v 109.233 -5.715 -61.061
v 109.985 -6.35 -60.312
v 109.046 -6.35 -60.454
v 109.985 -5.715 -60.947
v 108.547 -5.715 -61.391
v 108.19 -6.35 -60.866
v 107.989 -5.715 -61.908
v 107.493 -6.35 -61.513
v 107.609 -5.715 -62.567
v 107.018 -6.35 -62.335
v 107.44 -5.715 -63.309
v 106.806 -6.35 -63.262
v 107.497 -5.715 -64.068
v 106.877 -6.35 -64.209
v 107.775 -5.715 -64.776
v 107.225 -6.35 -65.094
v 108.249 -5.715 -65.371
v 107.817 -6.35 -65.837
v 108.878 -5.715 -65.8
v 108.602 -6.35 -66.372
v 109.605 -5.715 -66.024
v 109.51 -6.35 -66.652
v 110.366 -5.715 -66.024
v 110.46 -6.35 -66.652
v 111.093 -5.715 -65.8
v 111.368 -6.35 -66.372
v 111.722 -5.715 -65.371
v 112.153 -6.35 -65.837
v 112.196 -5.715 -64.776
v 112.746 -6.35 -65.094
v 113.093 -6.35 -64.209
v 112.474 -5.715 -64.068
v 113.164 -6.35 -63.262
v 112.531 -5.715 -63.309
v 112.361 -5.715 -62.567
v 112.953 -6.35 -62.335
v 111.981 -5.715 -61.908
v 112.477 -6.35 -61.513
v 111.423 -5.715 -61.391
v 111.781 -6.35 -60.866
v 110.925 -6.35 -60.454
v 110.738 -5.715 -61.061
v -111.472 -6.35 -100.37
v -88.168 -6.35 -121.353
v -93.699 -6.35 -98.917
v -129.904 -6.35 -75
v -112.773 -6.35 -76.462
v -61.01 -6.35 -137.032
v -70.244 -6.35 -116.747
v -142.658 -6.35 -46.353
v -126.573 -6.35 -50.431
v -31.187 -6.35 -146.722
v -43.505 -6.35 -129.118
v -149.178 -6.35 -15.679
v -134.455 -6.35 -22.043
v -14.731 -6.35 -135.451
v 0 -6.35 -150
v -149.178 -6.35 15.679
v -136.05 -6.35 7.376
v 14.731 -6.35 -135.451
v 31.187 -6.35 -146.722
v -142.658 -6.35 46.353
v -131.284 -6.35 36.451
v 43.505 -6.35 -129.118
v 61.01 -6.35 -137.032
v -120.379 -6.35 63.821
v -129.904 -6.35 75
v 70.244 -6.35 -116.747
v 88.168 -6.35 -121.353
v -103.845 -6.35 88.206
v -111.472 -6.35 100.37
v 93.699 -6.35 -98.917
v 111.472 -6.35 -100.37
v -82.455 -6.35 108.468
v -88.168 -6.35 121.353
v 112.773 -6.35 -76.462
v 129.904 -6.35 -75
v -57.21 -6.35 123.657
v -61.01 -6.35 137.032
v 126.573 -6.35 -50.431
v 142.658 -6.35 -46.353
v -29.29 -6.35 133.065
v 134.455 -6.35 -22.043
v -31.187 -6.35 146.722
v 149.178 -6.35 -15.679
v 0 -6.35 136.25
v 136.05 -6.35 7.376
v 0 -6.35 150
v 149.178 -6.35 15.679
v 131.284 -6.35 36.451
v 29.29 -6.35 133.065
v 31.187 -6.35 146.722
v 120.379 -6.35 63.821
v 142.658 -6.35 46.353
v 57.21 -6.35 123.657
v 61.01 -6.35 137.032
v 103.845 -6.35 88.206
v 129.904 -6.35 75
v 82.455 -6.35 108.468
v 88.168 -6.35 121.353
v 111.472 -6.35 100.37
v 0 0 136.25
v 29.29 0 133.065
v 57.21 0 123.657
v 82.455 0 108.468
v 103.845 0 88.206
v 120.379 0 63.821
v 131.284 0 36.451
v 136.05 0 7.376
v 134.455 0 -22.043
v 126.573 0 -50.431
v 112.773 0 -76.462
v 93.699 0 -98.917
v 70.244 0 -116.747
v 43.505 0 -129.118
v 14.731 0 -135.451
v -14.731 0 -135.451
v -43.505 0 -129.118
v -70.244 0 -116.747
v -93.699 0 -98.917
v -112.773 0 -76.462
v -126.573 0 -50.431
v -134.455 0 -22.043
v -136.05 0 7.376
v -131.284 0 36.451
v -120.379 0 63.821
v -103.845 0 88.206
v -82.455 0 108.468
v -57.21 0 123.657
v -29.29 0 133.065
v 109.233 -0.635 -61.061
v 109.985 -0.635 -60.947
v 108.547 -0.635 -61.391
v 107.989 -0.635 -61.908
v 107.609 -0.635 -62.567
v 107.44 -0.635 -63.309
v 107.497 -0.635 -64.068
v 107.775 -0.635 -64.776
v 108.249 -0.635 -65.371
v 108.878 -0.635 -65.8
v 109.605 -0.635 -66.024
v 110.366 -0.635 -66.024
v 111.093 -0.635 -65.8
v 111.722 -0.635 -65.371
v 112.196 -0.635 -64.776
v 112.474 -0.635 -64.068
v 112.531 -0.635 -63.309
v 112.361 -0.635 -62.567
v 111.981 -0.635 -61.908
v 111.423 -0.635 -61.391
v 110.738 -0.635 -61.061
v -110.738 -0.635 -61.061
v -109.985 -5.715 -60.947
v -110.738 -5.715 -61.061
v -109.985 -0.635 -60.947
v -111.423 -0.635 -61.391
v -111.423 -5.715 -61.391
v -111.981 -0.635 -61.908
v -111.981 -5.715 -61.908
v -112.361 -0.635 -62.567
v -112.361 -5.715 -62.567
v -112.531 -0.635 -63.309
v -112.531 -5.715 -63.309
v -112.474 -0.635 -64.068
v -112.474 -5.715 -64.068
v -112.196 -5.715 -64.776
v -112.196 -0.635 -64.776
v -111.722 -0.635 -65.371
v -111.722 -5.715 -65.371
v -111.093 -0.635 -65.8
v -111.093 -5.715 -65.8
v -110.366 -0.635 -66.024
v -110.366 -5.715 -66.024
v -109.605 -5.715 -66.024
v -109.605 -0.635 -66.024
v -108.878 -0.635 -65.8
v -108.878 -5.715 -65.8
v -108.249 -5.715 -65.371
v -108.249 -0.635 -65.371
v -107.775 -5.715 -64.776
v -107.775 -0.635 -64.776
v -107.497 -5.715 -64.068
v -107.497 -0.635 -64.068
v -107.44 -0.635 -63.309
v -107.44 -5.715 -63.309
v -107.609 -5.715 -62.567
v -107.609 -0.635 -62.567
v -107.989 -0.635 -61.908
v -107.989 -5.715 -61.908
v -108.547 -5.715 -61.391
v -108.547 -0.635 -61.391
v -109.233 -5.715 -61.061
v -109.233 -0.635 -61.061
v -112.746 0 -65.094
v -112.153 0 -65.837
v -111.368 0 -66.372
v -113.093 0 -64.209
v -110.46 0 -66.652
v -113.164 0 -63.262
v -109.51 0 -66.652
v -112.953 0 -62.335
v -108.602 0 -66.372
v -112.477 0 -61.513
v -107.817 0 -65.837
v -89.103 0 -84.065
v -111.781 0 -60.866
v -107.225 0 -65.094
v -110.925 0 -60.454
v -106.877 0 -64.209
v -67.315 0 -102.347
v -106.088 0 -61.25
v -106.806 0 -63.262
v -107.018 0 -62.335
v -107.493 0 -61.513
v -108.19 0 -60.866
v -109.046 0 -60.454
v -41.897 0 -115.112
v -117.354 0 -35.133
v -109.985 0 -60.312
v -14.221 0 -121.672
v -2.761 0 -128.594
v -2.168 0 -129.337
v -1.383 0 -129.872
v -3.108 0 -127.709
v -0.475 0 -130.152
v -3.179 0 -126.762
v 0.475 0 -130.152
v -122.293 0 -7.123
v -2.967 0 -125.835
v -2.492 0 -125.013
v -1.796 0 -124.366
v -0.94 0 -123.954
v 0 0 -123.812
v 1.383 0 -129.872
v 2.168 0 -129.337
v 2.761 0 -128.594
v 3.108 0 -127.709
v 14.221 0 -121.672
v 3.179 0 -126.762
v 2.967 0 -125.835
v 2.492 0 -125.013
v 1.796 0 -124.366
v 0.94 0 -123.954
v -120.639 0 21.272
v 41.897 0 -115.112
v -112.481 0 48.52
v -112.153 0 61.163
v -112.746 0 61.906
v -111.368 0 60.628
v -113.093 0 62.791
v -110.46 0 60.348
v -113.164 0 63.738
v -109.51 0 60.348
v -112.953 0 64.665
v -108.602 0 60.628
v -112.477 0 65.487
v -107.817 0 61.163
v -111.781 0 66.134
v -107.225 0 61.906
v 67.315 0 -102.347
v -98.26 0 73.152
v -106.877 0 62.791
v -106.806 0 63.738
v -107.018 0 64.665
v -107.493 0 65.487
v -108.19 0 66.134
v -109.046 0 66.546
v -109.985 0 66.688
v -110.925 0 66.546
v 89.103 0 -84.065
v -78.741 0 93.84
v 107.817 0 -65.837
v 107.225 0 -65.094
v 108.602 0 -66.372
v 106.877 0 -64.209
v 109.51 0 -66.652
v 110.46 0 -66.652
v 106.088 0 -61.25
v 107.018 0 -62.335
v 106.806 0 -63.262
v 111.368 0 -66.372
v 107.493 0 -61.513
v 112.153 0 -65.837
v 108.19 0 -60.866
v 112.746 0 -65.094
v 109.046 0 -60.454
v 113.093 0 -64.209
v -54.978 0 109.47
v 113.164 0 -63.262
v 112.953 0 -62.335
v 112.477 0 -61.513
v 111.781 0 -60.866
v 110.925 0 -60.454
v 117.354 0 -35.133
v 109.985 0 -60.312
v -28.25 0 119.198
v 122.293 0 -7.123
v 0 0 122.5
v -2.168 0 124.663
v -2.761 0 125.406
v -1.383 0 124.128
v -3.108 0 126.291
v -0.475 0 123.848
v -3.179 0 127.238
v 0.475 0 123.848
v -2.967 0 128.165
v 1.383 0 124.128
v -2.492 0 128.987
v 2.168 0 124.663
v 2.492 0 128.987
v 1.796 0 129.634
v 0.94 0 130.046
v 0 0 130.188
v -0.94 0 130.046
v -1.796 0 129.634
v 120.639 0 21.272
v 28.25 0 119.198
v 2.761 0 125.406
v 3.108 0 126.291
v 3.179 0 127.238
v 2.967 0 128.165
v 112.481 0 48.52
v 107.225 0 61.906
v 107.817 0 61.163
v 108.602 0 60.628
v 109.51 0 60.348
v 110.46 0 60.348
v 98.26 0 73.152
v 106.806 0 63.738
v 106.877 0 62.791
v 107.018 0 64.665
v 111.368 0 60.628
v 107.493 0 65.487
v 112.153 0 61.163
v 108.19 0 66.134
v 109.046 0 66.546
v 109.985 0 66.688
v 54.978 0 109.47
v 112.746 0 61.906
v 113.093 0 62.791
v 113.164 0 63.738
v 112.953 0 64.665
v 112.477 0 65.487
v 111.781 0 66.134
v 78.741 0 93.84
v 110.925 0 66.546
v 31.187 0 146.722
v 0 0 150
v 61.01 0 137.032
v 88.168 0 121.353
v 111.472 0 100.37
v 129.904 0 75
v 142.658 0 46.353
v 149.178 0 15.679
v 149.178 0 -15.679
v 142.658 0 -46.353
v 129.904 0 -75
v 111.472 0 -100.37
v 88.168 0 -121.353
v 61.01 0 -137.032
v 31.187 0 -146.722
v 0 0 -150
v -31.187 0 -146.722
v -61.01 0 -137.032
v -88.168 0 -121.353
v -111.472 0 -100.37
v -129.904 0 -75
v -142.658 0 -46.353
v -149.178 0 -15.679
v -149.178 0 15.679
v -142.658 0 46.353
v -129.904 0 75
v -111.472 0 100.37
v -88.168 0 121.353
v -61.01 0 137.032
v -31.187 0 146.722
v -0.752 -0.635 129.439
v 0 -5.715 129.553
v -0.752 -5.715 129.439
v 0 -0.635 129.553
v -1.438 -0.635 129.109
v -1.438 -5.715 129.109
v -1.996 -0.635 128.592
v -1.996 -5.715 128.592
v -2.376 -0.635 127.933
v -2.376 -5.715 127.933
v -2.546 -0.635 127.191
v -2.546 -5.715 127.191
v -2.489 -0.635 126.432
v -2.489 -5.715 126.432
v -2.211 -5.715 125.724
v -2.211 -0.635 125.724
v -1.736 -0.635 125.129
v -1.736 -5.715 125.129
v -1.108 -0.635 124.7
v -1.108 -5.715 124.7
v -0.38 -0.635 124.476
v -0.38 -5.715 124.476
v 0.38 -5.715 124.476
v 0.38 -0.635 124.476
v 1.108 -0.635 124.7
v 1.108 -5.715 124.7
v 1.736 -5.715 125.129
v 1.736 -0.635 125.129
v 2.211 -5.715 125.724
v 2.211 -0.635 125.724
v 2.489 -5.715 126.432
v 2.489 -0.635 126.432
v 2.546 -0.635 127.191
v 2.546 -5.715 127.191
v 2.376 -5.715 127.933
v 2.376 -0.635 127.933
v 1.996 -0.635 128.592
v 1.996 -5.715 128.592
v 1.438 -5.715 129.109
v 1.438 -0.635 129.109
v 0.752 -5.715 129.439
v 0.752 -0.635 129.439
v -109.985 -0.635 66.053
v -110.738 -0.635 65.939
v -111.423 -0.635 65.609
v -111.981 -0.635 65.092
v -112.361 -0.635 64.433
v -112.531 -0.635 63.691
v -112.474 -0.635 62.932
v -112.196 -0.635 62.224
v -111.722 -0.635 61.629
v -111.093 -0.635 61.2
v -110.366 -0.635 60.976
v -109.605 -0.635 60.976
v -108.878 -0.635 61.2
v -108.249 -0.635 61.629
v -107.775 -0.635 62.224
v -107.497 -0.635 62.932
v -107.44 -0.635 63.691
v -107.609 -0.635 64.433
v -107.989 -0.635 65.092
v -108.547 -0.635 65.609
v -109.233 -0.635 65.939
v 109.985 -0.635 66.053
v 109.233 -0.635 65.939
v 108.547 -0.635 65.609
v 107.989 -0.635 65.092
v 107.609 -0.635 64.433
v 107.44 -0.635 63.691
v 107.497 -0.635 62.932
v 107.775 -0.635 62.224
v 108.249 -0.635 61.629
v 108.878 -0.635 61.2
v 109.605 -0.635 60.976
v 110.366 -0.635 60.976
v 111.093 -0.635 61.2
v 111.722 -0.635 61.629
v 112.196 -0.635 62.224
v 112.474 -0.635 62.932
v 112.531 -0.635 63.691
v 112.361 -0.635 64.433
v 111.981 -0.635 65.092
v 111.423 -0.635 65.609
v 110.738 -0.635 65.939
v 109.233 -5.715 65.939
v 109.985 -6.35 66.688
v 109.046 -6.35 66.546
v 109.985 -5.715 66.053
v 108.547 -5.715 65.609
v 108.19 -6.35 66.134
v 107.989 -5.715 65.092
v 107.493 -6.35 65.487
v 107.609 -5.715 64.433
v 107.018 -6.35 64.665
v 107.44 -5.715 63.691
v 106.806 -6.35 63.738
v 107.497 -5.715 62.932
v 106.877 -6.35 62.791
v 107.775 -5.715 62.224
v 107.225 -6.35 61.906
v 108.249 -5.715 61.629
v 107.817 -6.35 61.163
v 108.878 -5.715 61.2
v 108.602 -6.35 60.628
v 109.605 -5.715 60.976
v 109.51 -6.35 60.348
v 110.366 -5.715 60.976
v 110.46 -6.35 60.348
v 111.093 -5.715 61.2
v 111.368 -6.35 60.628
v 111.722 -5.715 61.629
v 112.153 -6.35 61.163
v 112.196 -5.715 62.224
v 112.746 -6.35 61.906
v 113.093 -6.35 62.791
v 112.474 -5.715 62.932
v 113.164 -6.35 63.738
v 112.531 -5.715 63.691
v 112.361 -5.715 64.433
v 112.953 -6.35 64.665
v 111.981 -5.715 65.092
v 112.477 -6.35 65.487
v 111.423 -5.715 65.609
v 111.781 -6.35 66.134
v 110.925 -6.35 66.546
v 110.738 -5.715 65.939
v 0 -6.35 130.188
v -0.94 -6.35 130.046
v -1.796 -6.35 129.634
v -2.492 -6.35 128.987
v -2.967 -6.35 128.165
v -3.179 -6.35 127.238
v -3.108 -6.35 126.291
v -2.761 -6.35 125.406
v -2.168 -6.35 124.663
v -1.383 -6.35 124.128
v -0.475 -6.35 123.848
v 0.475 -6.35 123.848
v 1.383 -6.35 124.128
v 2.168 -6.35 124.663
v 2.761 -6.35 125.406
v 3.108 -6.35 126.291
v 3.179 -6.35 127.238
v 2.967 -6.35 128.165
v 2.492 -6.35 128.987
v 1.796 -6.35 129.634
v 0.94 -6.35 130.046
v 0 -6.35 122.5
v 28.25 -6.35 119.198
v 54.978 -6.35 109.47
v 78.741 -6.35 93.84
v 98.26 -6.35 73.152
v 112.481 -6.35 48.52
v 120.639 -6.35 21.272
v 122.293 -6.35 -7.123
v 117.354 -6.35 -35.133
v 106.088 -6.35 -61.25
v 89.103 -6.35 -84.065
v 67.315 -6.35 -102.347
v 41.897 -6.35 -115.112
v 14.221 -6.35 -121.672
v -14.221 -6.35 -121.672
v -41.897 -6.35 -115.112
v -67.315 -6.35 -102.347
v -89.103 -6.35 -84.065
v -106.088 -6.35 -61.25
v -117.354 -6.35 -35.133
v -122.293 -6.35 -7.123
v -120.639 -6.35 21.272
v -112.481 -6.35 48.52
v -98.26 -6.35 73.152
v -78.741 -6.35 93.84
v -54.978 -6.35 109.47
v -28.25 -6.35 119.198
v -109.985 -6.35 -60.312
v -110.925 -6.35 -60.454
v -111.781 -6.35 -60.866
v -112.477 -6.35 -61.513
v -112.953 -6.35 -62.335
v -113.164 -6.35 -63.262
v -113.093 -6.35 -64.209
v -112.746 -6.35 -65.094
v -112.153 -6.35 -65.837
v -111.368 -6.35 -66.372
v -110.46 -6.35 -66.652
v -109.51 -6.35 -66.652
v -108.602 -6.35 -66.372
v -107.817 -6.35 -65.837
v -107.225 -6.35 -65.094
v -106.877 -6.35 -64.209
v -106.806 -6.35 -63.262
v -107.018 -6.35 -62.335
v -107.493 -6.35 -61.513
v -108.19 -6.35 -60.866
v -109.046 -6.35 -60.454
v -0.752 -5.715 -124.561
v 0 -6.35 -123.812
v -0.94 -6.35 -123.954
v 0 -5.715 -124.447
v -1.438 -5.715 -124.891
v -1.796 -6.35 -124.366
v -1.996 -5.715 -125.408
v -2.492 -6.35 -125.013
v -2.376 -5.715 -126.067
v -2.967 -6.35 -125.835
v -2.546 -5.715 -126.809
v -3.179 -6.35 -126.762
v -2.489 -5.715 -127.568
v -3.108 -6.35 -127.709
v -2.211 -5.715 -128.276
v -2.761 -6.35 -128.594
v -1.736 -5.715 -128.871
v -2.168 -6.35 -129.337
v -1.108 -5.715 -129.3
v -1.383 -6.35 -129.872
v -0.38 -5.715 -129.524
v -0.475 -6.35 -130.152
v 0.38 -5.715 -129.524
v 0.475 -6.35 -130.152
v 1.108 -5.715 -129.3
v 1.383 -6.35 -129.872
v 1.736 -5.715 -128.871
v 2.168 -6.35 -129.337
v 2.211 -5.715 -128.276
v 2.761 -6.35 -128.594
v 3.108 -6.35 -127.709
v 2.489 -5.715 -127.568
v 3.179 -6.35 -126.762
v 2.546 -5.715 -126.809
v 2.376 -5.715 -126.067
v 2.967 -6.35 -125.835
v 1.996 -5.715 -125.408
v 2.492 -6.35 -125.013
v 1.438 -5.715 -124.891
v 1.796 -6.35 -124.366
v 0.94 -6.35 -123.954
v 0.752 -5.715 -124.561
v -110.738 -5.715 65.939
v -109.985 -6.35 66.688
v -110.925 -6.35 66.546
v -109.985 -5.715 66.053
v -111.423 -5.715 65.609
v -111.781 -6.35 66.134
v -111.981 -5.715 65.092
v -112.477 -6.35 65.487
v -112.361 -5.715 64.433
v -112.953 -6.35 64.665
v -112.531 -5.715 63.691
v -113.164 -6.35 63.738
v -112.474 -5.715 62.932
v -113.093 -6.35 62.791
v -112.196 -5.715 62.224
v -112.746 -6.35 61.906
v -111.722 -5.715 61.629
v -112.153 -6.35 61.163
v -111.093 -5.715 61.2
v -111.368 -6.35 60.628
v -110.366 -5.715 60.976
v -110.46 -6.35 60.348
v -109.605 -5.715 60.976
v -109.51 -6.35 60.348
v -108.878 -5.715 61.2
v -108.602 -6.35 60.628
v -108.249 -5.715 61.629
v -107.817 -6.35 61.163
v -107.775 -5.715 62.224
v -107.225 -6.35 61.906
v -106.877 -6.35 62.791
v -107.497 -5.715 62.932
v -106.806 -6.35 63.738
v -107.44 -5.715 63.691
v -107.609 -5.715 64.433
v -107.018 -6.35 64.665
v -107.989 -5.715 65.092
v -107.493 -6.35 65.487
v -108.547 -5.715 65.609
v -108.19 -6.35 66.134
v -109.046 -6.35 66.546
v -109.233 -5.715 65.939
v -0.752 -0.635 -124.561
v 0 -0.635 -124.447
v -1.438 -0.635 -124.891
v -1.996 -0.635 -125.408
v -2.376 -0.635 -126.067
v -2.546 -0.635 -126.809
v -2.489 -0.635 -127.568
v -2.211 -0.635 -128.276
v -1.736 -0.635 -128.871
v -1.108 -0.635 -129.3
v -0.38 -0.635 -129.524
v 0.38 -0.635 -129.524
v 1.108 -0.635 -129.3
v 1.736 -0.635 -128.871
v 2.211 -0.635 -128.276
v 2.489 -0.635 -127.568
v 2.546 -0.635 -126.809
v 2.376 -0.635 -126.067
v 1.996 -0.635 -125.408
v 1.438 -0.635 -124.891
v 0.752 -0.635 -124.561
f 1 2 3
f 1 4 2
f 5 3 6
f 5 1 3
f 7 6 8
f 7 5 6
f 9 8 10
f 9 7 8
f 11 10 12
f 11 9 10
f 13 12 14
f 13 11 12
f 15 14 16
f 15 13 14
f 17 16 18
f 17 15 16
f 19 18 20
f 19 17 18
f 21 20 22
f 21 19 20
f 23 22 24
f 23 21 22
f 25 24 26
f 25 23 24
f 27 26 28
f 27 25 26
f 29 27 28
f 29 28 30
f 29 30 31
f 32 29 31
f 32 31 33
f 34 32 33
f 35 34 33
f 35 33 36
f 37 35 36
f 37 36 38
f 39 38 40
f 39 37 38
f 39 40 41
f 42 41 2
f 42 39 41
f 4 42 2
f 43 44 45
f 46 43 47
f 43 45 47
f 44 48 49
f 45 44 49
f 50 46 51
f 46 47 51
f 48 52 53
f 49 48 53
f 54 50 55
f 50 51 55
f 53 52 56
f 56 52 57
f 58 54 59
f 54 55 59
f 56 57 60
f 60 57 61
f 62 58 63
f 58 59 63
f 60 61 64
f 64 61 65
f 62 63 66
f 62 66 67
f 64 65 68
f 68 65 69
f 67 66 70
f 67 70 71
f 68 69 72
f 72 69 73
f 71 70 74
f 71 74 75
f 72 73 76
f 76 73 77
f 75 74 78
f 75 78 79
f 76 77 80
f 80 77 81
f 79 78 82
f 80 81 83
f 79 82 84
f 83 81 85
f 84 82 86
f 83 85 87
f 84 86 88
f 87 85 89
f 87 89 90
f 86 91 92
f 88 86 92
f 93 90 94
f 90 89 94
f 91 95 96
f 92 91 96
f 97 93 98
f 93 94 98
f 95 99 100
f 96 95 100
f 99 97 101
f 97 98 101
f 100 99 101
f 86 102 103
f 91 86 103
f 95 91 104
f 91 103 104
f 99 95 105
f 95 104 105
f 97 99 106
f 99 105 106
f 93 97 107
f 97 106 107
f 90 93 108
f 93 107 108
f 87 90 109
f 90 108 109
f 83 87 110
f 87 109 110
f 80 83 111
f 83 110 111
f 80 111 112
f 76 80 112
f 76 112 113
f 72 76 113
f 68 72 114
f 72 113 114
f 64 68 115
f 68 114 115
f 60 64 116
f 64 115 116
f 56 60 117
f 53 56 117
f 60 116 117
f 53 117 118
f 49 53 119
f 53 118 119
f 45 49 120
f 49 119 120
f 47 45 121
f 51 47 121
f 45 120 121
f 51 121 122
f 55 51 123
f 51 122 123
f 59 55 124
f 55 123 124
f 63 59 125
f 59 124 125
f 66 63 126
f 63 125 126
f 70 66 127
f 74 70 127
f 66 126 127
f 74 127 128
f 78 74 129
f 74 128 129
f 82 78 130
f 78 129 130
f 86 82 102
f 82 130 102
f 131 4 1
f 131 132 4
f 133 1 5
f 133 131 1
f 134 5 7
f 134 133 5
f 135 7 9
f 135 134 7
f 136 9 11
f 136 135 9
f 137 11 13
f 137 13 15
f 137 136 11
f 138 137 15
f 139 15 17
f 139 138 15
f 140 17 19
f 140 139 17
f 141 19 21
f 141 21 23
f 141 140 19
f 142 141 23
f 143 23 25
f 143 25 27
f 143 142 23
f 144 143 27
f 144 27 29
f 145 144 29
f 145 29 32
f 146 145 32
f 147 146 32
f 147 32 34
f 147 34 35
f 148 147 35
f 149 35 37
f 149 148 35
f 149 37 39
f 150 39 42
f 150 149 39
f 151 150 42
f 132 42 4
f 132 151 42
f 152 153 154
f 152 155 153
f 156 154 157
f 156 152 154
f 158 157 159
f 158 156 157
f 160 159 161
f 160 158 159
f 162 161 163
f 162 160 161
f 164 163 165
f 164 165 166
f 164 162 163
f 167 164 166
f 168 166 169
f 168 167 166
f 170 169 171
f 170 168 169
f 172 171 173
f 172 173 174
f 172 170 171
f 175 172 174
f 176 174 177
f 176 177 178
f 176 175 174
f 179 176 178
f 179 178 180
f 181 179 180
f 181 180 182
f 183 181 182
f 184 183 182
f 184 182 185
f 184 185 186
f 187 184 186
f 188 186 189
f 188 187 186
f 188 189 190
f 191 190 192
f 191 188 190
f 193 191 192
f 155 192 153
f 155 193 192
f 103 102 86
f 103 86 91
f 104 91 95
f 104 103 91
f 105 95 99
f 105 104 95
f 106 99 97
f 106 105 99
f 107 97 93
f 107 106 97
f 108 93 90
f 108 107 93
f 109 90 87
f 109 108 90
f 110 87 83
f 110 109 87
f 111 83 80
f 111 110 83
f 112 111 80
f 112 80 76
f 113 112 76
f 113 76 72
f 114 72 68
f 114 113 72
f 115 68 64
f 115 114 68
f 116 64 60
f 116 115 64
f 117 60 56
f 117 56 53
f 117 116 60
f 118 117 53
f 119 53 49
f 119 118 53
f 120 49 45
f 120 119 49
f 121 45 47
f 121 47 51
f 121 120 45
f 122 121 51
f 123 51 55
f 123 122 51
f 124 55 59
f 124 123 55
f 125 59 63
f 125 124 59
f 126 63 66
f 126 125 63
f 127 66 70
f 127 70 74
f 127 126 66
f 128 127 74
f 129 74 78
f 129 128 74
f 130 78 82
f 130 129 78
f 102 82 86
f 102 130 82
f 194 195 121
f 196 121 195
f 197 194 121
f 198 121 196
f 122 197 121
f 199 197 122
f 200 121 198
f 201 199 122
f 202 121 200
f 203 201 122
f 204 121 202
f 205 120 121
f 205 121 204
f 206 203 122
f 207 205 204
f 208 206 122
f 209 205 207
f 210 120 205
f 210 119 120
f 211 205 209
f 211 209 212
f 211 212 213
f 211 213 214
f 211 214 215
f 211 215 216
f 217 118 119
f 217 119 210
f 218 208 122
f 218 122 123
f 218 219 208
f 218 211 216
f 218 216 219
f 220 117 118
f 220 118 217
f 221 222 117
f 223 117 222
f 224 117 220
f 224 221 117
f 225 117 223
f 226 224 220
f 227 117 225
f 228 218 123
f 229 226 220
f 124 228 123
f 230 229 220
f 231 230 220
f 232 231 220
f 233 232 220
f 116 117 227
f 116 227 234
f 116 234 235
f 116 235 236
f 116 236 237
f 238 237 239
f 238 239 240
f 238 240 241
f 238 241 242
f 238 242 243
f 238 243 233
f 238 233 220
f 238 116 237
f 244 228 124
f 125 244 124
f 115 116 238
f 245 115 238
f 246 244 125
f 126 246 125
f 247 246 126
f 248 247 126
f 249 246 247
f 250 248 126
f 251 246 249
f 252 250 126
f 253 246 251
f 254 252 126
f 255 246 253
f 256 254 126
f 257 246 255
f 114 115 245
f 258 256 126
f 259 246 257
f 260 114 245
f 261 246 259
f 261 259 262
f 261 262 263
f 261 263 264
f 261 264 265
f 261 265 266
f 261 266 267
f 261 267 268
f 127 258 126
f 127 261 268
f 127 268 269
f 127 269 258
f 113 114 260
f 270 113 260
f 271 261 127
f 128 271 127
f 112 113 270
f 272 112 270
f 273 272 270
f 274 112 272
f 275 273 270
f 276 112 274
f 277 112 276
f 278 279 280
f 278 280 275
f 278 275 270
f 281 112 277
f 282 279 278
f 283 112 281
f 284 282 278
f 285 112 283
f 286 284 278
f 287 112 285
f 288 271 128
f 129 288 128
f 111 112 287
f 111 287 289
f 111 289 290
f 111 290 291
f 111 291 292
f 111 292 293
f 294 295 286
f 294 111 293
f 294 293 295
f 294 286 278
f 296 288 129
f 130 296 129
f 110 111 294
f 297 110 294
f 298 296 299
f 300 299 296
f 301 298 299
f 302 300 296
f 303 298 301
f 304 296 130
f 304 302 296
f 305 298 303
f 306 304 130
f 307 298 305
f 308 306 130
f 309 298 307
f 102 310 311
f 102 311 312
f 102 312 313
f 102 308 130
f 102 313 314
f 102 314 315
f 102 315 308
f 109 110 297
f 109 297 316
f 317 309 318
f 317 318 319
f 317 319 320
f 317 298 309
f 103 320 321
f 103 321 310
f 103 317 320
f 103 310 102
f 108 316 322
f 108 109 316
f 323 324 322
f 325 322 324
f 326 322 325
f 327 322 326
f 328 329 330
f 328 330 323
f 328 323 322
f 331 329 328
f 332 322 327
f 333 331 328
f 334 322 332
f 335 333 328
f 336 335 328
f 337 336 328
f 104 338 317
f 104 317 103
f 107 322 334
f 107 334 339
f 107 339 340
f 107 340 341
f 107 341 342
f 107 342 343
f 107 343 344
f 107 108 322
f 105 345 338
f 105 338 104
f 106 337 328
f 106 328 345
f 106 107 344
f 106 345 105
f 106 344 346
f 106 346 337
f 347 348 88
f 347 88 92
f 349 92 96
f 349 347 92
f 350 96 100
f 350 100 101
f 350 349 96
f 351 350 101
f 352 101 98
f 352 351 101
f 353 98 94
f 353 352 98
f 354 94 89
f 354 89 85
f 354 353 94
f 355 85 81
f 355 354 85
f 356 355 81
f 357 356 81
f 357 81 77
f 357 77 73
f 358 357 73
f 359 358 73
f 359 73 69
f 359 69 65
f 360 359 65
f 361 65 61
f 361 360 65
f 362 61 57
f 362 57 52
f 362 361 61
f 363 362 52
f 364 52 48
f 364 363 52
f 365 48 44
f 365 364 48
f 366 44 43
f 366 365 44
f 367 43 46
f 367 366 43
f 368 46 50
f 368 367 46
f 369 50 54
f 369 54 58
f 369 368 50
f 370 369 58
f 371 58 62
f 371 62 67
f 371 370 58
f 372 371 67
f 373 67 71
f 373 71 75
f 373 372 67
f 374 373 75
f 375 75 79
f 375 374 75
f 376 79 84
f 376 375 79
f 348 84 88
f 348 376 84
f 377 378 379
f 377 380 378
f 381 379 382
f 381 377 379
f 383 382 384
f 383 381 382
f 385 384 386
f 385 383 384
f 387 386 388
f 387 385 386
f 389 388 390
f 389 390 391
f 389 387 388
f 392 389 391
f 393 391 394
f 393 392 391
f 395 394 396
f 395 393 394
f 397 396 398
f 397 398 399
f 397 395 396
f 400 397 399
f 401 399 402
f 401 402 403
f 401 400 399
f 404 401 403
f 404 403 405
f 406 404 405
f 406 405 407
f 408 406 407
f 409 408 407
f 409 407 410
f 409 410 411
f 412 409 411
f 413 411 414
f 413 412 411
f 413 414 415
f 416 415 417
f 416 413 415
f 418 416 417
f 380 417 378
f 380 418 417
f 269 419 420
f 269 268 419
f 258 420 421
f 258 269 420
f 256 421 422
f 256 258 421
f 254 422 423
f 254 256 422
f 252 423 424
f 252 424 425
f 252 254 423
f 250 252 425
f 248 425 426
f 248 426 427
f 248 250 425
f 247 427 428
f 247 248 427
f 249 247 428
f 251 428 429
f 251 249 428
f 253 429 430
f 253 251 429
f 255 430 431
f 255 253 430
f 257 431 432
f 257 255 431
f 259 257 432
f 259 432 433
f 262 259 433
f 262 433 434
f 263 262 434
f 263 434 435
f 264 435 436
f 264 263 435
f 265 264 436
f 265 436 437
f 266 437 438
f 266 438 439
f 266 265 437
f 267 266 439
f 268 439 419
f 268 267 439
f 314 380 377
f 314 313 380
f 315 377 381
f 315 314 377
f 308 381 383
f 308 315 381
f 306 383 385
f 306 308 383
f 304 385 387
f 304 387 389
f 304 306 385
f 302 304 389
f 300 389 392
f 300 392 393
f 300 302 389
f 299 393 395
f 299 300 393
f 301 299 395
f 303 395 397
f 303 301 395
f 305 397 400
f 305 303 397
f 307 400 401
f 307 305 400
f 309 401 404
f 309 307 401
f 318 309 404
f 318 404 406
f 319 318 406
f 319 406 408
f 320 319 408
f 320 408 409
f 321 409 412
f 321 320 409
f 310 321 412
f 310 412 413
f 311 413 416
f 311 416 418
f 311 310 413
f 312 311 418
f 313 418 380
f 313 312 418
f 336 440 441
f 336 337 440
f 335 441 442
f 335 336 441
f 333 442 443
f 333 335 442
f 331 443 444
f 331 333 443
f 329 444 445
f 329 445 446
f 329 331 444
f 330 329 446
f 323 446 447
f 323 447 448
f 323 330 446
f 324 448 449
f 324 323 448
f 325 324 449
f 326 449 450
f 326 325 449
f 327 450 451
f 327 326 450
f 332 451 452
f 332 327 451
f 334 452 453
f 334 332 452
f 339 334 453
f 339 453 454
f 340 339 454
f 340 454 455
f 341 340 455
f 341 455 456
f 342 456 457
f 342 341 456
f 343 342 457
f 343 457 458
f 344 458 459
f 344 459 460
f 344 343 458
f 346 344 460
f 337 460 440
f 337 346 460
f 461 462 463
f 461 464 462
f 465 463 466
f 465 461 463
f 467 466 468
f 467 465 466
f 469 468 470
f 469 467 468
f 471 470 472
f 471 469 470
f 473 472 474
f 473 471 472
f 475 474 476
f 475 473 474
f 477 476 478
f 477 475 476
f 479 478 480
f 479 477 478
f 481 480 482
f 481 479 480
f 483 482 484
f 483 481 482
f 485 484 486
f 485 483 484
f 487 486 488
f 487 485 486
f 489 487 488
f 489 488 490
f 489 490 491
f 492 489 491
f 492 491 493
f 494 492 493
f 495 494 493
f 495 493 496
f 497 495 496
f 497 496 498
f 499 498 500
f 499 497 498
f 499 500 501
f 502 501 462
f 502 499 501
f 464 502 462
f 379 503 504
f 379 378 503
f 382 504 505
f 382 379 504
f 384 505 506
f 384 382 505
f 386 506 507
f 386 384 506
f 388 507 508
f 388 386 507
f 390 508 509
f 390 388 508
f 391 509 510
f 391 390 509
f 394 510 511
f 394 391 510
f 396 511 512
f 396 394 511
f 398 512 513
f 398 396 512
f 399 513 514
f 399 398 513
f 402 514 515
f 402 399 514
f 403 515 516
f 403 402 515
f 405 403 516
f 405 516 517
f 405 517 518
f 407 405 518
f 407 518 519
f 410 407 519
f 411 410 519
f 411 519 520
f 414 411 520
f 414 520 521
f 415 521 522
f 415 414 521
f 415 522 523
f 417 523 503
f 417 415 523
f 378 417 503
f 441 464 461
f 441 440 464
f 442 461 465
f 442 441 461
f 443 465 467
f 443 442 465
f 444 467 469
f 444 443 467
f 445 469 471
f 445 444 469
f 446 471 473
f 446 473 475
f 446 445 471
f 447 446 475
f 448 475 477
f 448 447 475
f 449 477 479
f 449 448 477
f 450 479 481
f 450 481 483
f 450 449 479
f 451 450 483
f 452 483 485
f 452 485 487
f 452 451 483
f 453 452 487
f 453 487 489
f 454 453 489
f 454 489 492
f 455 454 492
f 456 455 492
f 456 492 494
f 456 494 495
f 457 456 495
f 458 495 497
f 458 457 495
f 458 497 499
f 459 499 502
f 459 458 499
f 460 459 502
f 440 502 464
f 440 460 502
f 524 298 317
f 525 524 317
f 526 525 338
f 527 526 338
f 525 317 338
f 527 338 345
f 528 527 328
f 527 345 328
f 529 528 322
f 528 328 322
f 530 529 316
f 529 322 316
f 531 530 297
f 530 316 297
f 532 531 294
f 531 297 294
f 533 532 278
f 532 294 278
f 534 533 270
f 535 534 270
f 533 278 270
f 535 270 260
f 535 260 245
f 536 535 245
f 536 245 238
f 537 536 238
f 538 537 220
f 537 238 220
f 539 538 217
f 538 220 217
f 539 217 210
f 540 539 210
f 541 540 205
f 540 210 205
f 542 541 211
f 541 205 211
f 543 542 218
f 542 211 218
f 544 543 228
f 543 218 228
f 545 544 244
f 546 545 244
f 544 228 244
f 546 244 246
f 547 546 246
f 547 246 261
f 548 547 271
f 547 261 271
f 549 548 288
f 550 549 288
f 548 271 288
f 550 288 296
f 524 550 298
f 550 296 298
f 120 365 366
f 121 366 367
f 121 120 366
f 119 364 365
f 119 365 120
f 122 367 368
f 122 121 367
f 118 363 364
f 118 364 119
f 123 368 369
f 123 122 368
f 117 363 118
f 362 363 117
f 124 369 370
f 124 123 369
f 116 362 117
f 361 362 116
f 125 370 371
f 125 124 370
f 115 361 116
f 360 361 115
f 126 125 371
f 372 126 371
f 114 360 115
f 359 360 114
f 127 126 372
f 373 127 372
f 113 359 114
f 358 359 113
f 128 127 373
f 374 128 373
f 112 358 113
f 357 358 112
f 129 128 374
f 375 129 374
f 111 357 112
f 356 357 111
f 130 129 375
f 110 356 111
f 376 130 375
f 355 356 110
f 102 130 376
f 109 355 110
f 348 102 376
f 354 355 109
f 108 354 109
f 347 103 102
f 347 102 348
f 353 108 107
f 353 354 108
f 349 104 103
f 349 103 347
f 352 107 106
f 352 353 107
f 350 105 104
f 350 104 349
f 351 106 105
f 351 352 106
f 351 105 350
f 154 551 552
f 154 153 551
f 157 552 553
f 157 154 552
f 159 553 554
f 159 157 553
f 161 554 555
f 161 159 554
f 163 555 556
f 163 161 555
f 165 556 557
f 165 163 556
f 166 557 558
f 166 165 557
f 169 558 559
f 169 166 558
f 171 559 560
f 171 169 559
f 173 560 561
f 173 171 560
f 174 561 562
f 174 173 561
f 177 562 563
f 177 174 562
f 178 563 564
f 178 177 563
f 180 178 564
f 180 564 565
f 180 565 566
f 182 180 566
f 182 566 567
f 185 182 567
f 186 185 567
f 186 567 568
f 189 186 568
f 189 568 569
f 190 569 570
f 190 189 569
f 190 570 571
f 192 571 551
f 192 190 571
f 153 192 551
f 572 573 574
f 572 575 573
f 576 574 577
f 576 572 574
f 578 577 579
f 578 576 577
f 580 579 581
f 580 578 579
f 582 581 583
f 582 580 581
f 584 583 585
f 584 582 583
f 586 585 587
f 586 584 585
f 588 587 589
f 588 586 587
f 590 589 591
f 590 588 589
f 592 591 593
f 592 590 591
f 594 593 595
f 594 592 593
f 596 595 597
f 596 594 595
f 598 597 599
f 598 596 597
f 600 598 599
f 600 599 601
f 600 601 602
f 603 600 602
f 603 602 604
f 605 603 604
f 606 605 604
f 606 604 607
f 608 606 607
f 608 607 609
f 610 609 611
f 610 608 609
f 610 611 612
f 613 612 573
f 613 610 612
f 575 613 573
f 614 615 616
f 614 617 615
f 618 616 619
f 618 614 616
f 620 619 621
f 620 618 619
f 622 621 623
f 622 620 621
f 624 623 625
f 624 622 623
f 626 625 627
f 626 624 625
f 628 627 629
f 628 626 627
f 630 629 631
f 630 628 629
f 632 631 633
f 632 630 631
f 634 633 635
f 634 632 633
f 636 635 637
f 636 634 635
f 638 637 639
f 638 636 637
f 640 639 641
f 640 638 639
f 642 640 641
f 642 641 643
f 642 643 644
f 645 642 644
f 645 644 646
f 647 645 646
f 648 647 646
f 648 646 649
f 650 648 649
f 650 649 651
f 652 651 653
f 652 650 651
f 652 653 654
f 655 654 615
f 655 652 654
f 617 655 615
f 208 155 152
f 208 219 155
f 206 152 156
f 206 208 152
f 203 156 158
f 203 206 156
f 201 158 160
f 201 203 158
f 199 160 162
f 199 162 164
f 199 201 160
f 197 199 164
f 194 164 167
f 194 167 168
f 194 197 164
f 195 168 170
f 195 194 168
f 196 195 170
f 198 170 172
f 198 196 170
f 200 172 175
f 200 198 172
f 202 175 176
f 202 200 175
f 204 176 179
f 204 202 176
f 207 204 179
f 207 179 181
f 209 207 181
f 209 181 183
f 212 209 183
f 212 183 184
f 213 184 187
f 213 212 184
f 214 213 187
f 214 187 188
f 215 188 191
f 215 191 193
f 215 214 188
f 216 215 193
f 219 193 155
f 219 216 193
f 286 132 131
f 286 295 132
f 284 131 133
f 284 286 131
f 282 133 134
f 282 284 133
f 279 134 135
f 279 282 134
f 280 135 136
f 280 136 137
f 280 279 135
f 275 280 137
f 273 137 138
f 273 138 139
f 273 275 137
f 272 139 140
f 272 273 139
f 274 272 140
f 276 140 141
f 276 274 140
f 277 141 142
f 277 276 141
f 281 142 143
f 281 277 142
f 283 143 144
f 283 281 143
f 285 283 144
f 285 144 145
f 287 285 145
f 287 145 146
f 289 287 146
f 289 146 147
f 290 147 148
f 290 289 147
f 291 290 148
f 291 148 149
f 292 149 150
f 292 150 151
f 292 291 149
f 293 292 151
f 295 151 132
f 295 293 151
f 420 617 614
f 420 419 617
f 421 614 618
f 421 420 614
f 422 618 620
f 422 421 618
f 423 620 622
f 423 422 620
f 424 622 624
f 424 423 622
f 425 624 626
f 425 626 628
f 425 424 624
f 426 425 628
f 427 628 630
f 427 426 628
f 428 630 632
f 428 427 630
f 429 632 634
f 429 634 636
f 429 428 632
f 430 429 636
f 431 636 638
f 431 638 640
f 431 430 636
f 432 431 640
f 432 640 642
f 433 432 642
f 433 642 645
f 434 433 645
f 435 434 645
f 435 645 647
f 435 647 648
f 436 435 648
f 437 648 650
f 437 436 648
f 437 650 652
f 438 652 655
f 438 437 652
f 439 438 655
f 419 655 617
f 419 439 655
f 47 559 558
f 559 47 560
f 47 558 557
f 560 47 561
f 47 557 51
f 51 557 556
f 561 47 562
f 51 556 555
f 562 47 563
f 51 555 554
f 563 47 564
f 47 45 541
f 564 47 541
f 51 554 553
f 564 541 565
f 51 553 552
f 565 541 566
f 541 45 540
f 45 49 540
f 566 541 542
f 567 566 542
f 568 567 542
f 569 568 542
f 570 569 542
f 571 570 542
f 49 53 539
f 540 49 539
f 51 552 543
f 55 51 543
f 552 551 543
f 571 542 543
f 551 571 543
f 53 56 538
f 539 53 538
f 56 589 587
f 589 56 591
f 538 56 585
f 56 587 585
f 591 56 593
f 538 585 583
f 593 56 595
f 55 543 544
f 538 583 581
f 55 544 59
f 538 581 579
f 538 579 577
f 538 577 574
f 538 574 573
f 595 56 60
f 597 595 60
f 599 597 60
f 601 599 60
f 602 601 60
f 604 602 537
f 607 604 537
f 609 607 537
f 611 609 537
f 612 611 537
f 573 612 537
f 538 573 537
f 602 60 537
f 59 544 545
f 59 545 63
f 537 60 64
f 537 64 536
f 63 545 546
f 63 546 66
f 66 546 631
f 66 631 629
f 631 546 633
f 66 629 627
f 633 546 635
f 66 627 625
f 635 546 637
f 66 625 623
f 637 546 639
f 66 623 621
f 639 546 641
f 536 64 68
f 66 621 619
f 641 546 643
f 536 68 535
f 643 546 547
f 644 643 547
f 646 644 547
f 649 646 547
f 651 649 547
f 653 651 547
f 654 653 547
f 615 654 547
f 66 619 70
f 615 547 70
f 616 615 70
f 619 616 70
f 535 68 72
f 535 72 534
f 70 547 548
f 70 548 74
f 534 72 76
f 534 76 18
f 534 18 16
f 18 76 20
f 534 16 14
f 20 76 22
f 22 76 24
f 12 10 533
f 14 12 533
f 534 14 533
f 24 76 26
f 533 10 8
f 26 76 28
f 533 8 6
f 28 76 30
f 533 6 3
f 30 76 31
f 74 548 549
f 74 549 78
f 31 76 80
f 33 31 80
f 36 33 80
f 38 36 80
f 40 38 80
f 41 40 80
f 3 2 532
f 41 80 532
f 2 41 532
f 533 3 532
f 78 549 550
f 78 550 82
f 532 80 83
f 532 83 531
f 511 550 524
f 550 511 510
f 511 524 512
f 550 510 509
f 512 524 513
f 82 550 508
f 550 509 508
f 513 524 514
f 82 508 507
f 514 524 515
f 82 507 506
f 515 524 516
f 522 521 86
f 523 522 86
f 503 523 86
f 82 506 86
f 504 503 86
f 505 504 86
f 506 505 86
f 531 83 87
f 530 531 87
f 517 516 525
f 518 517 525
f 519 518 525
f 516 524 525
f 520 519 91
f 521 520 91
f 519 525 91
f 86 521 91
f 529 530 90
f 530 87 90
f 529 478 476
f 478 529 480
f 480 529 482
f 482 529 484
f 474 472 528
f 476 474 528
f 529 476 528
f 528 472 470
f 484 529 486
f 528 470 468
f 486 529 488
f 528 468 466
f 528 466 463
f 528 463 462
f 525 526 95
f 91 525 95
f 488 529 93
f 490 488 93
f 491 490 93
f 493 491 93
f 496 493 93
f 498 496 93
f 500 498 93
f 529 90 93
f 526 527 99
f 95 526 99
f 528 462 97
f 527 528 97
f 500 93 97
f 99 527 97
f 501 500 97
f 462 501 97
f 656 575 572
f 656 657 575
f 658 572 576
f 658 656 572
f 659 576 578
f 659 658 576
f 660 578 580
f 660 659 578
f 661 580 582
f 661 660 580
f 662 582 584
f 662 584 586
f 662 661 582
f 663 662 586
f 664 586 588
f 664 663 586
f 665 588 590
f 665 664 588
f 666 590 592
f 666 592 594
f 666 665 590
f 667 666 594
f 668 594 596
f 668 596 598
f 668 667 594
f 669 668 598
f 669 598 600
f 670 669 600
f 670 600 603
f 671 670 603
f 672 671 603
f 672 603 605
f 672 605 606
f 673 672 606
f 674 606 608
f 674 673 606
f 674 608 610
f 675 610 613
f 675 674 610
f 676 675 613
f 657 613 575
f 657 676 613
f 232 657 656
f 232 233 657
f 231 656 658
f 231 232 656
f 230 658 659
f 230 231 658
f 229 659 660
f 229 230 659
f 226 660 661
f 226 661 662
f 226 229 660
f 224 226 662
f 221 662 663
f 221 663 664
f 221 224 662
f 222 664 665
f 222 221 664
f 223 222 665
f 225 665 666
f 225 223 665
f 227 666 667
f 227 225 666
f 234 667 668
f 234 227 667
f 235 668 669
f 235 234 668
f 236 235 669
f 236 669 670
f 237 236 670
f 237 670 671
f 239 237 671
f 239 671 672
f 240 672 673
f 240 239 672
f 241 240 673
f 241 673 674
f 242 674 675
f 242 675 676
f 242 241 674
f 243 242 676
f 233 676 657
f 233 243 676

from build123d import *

# Parameters (mm, degrees)
SKETCH1_R                       = 150
SKETCH1_R_2                     = 136.25
BOSS_EXTRUDE1_DEPTH             = 6.35
SKETCH1_3_R                     = 136.25
SKETCH1_3_R_2                   = 122.5
BOSS_EXTRUDE2_DEPTH             = 6.35
F_10_CLEARANCE_HOLE1_AT_2_COUNT = 2
F_10_CLEARANCE_HOLE1_AT_2_PITCH = 127
F_10_CLEARANCE_HOLE1_AT_3_COUNT = 2
F_10_CLEARANCE_HOLE1_AT_3_PITCH = 219.970452561
F_10_CLEARANCE_HOLE1_AT_4_COUNT = 2
F_10_CLEARANCE_HOLE1_AT_4_PITCH = 254
F_10_CLEARANCE_HOLE1_AT_5_COUNT = 2
F_10_CLEARANCE_HOLE1_AT_5_PITCH = 219.970452561
F_10_CLEARANCE_HOLE1_AT_6_COUNT = 2
F_10_CLEARANCE_HOLE1_AT_6_PITCH = 127


with BuildPart() as part:
    # Sketch1 → Boss-Extrude1 (new body)
    with BuildSketch(Plane(origin=(0, 0, 0), x_dir=(1, 0, 0), z_dir=(0, 1, 0))):
        Circle(SKETCH1_R)
        Circle(SKETCH1_R_2, mode=Mode.SUBTRACT)
    extrude(amount=-BOSS_EXTRUDE1_DEPTH)


with BuildPart() as body_2:
    # Sketch1<3> → Boss-Extrude2 (new body)
    with BuildSketch(Plane(origin=(0, 0, 0), x_dir=(1, 0, 0), z_dir=(0, 1, 0))):
        Circle(SKETCH1_3_R)
        Circle(SKETCH1_3_R_2, mode=Mode.SUBTRACT)
    extrude(amount=-BOSS_EXTRUDE2_DEPTH)

    # Sketch3 → #10 Clearance Hole1 (revolve, cut)
    with BuildSketch(Plane(origin=(-109.985226281, 0, -63.5), x_dir=(0, 0, 1), z_dir=(1, 0, 0))):
        Polygon((0, 0), (0, 6.35), (3.1877, 6.35), (2.5527, 5.715), (2.5527, 0.635), (3.1877, 0), align=None)
    f_10_clearance_hole1 = revolve(axis=Axis((-109.985226281, 6.35, -63.5), (0, -1, 0)), mode=Mode.SUBTRACT)

    # #10 Clearance Hole1 at 2: #10 Clearance Hole1 ×2
    with Locations(*[Vector(0.8660254037844387, 0, -0.5) * (i * F_10_CLEARANCE_HOLE1_AT_2_PITCH) for i in range(1, F_10_CLEARANCE_HOLE1_AT_2_COUNT)]):
        add(f_10_clearance_hole1, mode=Mode.SUBTRACT)

    # #10 Clearance Hole1 at 3: #10 Clearance Hole1 ×2
    with Locations(*[(i * F_10_CLEARANCE_HOLE1_AT_3_PITCH, 0, 0) for i in range(1, F_10_CLEARANCE_HOLE1_AT_3_COUNT)]):
        add(f_10_clearance_hole1, mode=Mode.SUBTRACT)

    # #10 Clearance Hole1 at 4: #10 Clearance Hole1 ×2
    with Locations(*[Vector(0.8660254037844387, 0, 0.49999999999999994) * (i * F_10_CLEARANCE_HOLE1_AT_4_PITCH) for i in range(1, F_10_CLEARANCE_HOLE1_AT_4_COUNT)]):
        add(f_10_clearance_hole1, mode=Mode.SUBTRACT)

    # #10 Clearance Hole1 at 5: #10 Clearance Hole1 ×2
    with Locations(*[Vector(0.5, 0, 0.8660254037844387) * (i * F_10_CLEARANCE_HOLE1_AT_5_PITCH) for i in range(1, F_10_CLEARANCE_HOLE1_AT_5_COUNT)]):
        add(f_10_clearance_hole1, mode=Mode.SUBTRACT)

    # #10 Clearance Hole1 at 6: #10 Clearance Hole1 ×2
    with Locations(*[(0, 0, i * F_10_CLEARANCE_HOLE1_AT_6_PITCH) for i in range(1, F_10_CLEARANCE_HOLE1_AT_6_COUNT)]):
        add(f_10_clearance_hole1, mode=Mode.SUBTRACT)


solid = Compound([part.part, body_2.part])
